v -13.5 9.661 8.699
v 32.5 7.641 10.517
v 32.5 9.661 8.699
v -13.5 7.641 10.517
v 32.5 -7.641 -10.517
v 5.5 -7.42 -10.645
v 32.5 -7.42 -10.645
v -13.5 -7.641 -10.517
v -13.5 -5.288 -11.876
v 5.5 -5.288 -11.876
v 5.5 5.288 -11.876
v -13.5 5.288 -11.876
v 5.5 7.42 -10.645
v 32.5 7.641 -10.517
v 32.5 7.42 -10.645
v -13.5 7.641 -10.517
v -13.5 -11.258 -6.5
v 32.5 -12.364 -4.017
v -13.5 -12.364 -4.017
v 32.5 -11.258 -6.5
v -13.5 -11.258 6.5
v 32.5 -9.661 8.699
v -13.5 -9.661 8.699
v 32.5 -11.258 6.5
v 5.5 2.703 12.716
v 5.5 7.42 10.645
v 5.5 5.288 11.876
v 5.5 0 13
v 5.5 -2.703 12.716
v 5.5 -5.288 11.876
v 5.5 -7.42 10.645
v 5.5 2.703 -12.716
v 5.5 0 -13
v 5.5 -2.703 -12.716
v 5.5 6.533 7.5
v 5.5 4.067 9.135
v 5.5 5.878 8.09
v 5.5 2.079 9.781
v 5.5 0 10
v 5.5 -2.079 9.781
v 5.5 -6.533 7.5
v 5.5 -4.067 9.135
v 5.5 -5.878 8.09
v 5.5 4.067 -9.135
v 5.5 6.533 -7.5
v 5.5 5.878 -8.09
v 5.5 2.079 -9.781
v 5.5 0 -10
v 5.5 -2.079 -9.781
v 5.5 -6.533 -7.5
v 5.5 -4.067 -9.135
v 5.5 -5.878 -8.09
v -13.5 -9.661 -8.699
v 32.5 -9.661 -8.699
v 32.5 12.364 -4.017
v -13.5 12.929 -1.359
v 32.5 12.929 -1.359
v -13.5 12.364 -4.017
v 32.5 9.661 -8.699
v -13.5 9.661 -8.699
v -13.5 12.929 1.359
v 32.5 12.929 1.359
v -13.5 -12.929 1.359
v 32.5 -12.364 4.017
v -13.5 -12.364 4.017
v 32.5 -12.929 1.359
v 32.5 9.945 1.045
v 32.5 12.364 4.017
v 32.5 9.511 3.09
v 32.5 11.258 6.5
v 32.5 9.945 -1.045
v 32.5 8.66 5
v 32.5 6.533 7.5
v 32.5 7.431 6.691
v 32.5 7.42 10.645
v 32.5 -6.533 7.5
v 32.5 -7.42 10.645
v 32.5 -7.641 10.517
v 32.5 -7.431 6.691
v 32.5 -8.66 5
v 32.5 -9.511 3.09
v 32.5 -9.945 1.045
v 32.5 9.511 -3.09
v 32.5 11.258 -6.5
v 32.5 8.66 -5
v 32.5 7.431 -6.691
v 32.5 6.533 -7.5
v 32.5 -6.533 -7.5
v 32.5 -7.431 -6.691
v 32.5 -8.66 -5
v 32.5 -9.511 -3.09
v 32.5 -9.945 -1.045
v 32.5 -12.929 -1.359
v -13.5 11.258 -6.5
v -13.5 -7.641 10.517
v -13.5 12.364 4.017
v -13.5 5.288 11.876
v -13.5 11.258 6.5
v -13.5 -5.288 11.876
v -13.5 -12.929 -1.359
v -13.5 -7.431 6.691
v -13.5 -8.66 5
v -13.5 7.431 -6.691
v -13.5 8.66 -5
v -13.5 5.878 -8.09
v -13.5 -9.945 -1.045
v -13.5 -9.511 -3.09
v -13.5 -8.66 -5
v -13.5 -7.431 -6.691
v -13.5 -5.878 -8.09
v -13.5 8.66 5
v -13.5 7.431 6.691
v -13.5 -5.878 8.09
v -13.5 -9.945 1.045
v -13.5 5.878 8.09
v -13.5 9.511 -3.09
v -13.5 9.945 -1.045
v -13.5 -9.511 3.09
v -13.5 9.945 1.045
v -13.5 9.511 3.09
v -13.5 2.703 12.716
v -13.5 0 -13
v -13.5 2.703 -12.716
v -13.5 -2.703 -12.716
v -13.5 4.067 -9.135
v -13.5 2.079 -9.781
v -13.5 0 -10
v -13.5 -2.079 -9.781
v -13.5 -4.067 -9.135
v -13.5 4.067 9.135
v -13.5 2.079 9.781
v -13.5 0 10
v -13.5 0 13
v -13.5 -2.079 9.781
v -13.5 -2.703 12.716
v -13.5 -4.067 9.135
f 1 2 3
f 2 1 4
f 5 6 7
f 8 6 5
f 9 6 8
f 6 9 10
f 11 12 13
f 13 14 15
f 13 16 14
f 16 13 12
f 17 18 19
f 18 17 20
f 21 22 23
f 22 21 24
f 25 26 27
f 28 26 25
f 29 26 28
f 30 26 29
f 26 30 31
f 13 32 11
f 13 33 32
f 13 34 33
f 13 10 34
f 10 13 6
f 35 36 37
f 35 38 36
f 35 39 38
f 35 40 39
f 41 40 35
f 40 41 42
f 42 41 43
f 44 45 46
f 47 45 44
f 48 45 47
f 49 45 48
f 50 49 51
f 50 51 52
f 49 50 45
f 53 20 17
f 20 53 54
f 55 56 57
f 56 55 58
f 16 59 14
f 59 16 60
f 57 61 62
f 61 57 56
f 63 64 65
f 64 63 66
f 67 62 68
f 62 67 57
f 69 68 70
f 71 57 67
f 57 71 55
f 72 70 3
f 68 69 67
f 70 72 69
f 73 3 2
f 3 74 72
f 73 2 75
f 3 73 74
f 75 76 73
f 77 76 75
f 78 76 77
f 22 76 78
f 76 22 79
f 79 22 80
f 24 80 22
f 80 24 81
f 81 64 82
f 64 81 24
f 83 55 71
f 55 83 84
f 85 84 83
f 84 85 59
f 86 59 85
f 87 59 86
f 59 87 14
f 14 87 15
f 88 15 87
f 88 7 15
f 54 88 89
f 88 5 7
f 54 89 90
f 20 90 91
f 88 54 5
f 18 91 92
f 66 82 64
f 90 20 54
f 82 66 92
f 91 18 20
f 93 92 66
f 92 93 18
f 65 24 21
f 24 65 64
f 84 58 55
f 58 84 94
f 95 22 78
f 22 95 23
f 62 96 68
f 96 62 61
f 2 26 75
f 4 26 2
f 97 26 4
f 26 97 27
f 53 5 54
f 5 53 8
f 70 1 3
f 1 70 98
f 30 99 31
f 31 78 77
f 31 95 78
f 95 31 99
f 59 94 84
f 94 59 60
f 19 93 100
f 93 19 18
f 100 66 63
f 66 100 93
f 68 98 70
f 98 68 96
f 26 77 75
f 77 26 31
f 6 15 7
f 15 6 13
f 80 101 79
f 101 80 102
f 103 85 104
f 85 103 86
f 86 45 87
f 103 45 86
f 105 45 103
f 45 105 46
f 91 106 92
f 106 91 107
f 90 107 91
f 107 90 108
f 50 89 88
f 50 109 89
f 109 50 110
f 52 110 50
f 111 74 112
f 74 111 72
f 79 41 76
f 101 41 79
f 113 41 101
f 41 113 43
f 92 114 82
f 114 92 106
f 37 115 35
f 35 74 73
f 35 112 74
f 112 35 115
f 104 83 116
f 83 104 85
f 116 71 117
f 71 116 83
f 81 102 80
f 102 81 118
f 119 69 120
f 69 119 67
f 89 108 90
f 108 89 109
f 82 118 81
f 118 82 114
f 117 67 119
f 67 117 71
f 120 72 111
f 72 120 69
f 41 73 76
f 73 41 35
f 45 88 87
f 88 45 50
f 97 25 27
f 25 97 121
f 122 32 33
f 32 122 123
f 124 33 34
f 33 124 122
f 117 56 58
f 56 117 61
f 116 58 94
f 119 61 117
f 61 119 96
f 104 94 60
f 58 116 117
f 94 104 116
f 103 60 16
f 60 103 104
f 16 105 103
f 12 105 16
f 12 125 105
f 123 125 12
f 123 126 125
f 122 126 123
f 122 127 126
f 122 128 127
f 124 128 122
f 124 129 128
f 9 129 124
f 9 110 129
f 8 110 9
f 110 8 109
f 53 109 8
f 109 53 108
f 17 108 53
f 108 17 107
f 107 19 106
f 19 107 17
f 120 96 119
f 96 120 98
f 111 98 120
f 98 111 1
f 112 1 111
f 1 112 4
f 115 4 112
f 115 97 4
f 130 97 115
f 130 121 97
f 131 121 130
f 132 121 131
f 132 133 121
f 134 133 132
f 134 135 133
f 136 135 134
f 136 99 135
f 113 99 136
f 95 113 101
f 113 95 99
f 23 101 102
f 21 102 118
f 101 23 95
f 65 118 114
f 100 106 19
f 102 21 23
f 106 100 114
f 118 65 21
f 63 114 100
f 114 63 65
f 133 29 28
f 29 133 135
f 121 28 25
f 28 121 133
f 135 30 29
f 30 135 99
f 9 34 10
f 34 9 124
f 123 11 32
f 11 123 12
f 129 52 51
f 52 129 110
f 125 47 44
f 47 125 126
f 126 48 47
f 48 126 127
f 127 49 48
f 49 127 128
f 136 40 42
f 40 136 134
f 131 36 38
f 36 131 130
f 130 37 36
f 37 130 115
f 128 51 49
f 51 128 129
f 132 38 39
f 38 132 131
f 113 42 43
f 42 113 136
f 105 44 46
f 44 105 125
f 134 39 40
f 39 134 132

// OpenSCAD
MOTOR_CASE_THICKNESS = 3;

MOTOR_HEIGHT = 15;
MOTOR_WIDTH  = 20;
MOTOR_LENGTH = 27;

REDUCTION_HEIGHT = 20;
REDUCTION_WIDHT  = 20;
REDUCTION_LENGTH = 19;

PLATE_LENGHT = 210;
PLATE_WIDTH  = MOTOR_WIDTH + 15;

union() {
    rotate([0, 0, 180])
    translate([-REDUCTION_LENGTH, 0, 0])
    union() {
        motor();
        reduction();
    }
//    plate();
//
//    translate([PLATE_LENGHT-MOTOR_LENGTH-REDUCTION_LENGTH, 0, 0])
//    union() {
//        motor();
//        reduction();
//    }
}

module motor() {
    difference() {
        intersection() { // Case
            rotate([0, 90, 0])
            cylinder(MOTOR_LENGTH, d=MOTOR_WIDTH + (MOTOR_CASE_THICKNESS*2), center=true);
            cube([MOTOR_LENGTH, 26, 21.29], center=true);
        };
        intersection() { // Motor
            rotate([0, 90, 0])
            cylinder(MOTOR_LENGTH, d=MOTOR_WIDTH, center=true);
            cube([MOTOR_LENGTH, MOTOR_WIDTH, MOTOR_HEIGHT], center=true);
        };
    };
}

module plate() {
    translate([-MOTOR_LENGTH/2, -(MOTOR_WIDTH+15)/2, (MOTOR_HEIGHT+MOTOR_CASE_THICKNESS)/2+3/2])
    cube([PLATE_LENGHT, PLATE_WIDTH, 2.5]);
}

module reduction() {
    translate([REDUCTION_LENGTH/2 + MOTOR_LENGTH/2, 0, 0])
    difference() {
        // Case
        rotate([0, 90, 0])
        cylinder(REDUCTION_LENGTH, d=MOTOR_WIDTH + (MOTOR_CASE_THICKNESS*2), center=true);
        // Reduction
        intersection() {
            rotate([0, 90, 0])
            cylinder(REDUCTION_LENGTH, d=MOTOR_WIDTH, center=true);
        };
    };
}
